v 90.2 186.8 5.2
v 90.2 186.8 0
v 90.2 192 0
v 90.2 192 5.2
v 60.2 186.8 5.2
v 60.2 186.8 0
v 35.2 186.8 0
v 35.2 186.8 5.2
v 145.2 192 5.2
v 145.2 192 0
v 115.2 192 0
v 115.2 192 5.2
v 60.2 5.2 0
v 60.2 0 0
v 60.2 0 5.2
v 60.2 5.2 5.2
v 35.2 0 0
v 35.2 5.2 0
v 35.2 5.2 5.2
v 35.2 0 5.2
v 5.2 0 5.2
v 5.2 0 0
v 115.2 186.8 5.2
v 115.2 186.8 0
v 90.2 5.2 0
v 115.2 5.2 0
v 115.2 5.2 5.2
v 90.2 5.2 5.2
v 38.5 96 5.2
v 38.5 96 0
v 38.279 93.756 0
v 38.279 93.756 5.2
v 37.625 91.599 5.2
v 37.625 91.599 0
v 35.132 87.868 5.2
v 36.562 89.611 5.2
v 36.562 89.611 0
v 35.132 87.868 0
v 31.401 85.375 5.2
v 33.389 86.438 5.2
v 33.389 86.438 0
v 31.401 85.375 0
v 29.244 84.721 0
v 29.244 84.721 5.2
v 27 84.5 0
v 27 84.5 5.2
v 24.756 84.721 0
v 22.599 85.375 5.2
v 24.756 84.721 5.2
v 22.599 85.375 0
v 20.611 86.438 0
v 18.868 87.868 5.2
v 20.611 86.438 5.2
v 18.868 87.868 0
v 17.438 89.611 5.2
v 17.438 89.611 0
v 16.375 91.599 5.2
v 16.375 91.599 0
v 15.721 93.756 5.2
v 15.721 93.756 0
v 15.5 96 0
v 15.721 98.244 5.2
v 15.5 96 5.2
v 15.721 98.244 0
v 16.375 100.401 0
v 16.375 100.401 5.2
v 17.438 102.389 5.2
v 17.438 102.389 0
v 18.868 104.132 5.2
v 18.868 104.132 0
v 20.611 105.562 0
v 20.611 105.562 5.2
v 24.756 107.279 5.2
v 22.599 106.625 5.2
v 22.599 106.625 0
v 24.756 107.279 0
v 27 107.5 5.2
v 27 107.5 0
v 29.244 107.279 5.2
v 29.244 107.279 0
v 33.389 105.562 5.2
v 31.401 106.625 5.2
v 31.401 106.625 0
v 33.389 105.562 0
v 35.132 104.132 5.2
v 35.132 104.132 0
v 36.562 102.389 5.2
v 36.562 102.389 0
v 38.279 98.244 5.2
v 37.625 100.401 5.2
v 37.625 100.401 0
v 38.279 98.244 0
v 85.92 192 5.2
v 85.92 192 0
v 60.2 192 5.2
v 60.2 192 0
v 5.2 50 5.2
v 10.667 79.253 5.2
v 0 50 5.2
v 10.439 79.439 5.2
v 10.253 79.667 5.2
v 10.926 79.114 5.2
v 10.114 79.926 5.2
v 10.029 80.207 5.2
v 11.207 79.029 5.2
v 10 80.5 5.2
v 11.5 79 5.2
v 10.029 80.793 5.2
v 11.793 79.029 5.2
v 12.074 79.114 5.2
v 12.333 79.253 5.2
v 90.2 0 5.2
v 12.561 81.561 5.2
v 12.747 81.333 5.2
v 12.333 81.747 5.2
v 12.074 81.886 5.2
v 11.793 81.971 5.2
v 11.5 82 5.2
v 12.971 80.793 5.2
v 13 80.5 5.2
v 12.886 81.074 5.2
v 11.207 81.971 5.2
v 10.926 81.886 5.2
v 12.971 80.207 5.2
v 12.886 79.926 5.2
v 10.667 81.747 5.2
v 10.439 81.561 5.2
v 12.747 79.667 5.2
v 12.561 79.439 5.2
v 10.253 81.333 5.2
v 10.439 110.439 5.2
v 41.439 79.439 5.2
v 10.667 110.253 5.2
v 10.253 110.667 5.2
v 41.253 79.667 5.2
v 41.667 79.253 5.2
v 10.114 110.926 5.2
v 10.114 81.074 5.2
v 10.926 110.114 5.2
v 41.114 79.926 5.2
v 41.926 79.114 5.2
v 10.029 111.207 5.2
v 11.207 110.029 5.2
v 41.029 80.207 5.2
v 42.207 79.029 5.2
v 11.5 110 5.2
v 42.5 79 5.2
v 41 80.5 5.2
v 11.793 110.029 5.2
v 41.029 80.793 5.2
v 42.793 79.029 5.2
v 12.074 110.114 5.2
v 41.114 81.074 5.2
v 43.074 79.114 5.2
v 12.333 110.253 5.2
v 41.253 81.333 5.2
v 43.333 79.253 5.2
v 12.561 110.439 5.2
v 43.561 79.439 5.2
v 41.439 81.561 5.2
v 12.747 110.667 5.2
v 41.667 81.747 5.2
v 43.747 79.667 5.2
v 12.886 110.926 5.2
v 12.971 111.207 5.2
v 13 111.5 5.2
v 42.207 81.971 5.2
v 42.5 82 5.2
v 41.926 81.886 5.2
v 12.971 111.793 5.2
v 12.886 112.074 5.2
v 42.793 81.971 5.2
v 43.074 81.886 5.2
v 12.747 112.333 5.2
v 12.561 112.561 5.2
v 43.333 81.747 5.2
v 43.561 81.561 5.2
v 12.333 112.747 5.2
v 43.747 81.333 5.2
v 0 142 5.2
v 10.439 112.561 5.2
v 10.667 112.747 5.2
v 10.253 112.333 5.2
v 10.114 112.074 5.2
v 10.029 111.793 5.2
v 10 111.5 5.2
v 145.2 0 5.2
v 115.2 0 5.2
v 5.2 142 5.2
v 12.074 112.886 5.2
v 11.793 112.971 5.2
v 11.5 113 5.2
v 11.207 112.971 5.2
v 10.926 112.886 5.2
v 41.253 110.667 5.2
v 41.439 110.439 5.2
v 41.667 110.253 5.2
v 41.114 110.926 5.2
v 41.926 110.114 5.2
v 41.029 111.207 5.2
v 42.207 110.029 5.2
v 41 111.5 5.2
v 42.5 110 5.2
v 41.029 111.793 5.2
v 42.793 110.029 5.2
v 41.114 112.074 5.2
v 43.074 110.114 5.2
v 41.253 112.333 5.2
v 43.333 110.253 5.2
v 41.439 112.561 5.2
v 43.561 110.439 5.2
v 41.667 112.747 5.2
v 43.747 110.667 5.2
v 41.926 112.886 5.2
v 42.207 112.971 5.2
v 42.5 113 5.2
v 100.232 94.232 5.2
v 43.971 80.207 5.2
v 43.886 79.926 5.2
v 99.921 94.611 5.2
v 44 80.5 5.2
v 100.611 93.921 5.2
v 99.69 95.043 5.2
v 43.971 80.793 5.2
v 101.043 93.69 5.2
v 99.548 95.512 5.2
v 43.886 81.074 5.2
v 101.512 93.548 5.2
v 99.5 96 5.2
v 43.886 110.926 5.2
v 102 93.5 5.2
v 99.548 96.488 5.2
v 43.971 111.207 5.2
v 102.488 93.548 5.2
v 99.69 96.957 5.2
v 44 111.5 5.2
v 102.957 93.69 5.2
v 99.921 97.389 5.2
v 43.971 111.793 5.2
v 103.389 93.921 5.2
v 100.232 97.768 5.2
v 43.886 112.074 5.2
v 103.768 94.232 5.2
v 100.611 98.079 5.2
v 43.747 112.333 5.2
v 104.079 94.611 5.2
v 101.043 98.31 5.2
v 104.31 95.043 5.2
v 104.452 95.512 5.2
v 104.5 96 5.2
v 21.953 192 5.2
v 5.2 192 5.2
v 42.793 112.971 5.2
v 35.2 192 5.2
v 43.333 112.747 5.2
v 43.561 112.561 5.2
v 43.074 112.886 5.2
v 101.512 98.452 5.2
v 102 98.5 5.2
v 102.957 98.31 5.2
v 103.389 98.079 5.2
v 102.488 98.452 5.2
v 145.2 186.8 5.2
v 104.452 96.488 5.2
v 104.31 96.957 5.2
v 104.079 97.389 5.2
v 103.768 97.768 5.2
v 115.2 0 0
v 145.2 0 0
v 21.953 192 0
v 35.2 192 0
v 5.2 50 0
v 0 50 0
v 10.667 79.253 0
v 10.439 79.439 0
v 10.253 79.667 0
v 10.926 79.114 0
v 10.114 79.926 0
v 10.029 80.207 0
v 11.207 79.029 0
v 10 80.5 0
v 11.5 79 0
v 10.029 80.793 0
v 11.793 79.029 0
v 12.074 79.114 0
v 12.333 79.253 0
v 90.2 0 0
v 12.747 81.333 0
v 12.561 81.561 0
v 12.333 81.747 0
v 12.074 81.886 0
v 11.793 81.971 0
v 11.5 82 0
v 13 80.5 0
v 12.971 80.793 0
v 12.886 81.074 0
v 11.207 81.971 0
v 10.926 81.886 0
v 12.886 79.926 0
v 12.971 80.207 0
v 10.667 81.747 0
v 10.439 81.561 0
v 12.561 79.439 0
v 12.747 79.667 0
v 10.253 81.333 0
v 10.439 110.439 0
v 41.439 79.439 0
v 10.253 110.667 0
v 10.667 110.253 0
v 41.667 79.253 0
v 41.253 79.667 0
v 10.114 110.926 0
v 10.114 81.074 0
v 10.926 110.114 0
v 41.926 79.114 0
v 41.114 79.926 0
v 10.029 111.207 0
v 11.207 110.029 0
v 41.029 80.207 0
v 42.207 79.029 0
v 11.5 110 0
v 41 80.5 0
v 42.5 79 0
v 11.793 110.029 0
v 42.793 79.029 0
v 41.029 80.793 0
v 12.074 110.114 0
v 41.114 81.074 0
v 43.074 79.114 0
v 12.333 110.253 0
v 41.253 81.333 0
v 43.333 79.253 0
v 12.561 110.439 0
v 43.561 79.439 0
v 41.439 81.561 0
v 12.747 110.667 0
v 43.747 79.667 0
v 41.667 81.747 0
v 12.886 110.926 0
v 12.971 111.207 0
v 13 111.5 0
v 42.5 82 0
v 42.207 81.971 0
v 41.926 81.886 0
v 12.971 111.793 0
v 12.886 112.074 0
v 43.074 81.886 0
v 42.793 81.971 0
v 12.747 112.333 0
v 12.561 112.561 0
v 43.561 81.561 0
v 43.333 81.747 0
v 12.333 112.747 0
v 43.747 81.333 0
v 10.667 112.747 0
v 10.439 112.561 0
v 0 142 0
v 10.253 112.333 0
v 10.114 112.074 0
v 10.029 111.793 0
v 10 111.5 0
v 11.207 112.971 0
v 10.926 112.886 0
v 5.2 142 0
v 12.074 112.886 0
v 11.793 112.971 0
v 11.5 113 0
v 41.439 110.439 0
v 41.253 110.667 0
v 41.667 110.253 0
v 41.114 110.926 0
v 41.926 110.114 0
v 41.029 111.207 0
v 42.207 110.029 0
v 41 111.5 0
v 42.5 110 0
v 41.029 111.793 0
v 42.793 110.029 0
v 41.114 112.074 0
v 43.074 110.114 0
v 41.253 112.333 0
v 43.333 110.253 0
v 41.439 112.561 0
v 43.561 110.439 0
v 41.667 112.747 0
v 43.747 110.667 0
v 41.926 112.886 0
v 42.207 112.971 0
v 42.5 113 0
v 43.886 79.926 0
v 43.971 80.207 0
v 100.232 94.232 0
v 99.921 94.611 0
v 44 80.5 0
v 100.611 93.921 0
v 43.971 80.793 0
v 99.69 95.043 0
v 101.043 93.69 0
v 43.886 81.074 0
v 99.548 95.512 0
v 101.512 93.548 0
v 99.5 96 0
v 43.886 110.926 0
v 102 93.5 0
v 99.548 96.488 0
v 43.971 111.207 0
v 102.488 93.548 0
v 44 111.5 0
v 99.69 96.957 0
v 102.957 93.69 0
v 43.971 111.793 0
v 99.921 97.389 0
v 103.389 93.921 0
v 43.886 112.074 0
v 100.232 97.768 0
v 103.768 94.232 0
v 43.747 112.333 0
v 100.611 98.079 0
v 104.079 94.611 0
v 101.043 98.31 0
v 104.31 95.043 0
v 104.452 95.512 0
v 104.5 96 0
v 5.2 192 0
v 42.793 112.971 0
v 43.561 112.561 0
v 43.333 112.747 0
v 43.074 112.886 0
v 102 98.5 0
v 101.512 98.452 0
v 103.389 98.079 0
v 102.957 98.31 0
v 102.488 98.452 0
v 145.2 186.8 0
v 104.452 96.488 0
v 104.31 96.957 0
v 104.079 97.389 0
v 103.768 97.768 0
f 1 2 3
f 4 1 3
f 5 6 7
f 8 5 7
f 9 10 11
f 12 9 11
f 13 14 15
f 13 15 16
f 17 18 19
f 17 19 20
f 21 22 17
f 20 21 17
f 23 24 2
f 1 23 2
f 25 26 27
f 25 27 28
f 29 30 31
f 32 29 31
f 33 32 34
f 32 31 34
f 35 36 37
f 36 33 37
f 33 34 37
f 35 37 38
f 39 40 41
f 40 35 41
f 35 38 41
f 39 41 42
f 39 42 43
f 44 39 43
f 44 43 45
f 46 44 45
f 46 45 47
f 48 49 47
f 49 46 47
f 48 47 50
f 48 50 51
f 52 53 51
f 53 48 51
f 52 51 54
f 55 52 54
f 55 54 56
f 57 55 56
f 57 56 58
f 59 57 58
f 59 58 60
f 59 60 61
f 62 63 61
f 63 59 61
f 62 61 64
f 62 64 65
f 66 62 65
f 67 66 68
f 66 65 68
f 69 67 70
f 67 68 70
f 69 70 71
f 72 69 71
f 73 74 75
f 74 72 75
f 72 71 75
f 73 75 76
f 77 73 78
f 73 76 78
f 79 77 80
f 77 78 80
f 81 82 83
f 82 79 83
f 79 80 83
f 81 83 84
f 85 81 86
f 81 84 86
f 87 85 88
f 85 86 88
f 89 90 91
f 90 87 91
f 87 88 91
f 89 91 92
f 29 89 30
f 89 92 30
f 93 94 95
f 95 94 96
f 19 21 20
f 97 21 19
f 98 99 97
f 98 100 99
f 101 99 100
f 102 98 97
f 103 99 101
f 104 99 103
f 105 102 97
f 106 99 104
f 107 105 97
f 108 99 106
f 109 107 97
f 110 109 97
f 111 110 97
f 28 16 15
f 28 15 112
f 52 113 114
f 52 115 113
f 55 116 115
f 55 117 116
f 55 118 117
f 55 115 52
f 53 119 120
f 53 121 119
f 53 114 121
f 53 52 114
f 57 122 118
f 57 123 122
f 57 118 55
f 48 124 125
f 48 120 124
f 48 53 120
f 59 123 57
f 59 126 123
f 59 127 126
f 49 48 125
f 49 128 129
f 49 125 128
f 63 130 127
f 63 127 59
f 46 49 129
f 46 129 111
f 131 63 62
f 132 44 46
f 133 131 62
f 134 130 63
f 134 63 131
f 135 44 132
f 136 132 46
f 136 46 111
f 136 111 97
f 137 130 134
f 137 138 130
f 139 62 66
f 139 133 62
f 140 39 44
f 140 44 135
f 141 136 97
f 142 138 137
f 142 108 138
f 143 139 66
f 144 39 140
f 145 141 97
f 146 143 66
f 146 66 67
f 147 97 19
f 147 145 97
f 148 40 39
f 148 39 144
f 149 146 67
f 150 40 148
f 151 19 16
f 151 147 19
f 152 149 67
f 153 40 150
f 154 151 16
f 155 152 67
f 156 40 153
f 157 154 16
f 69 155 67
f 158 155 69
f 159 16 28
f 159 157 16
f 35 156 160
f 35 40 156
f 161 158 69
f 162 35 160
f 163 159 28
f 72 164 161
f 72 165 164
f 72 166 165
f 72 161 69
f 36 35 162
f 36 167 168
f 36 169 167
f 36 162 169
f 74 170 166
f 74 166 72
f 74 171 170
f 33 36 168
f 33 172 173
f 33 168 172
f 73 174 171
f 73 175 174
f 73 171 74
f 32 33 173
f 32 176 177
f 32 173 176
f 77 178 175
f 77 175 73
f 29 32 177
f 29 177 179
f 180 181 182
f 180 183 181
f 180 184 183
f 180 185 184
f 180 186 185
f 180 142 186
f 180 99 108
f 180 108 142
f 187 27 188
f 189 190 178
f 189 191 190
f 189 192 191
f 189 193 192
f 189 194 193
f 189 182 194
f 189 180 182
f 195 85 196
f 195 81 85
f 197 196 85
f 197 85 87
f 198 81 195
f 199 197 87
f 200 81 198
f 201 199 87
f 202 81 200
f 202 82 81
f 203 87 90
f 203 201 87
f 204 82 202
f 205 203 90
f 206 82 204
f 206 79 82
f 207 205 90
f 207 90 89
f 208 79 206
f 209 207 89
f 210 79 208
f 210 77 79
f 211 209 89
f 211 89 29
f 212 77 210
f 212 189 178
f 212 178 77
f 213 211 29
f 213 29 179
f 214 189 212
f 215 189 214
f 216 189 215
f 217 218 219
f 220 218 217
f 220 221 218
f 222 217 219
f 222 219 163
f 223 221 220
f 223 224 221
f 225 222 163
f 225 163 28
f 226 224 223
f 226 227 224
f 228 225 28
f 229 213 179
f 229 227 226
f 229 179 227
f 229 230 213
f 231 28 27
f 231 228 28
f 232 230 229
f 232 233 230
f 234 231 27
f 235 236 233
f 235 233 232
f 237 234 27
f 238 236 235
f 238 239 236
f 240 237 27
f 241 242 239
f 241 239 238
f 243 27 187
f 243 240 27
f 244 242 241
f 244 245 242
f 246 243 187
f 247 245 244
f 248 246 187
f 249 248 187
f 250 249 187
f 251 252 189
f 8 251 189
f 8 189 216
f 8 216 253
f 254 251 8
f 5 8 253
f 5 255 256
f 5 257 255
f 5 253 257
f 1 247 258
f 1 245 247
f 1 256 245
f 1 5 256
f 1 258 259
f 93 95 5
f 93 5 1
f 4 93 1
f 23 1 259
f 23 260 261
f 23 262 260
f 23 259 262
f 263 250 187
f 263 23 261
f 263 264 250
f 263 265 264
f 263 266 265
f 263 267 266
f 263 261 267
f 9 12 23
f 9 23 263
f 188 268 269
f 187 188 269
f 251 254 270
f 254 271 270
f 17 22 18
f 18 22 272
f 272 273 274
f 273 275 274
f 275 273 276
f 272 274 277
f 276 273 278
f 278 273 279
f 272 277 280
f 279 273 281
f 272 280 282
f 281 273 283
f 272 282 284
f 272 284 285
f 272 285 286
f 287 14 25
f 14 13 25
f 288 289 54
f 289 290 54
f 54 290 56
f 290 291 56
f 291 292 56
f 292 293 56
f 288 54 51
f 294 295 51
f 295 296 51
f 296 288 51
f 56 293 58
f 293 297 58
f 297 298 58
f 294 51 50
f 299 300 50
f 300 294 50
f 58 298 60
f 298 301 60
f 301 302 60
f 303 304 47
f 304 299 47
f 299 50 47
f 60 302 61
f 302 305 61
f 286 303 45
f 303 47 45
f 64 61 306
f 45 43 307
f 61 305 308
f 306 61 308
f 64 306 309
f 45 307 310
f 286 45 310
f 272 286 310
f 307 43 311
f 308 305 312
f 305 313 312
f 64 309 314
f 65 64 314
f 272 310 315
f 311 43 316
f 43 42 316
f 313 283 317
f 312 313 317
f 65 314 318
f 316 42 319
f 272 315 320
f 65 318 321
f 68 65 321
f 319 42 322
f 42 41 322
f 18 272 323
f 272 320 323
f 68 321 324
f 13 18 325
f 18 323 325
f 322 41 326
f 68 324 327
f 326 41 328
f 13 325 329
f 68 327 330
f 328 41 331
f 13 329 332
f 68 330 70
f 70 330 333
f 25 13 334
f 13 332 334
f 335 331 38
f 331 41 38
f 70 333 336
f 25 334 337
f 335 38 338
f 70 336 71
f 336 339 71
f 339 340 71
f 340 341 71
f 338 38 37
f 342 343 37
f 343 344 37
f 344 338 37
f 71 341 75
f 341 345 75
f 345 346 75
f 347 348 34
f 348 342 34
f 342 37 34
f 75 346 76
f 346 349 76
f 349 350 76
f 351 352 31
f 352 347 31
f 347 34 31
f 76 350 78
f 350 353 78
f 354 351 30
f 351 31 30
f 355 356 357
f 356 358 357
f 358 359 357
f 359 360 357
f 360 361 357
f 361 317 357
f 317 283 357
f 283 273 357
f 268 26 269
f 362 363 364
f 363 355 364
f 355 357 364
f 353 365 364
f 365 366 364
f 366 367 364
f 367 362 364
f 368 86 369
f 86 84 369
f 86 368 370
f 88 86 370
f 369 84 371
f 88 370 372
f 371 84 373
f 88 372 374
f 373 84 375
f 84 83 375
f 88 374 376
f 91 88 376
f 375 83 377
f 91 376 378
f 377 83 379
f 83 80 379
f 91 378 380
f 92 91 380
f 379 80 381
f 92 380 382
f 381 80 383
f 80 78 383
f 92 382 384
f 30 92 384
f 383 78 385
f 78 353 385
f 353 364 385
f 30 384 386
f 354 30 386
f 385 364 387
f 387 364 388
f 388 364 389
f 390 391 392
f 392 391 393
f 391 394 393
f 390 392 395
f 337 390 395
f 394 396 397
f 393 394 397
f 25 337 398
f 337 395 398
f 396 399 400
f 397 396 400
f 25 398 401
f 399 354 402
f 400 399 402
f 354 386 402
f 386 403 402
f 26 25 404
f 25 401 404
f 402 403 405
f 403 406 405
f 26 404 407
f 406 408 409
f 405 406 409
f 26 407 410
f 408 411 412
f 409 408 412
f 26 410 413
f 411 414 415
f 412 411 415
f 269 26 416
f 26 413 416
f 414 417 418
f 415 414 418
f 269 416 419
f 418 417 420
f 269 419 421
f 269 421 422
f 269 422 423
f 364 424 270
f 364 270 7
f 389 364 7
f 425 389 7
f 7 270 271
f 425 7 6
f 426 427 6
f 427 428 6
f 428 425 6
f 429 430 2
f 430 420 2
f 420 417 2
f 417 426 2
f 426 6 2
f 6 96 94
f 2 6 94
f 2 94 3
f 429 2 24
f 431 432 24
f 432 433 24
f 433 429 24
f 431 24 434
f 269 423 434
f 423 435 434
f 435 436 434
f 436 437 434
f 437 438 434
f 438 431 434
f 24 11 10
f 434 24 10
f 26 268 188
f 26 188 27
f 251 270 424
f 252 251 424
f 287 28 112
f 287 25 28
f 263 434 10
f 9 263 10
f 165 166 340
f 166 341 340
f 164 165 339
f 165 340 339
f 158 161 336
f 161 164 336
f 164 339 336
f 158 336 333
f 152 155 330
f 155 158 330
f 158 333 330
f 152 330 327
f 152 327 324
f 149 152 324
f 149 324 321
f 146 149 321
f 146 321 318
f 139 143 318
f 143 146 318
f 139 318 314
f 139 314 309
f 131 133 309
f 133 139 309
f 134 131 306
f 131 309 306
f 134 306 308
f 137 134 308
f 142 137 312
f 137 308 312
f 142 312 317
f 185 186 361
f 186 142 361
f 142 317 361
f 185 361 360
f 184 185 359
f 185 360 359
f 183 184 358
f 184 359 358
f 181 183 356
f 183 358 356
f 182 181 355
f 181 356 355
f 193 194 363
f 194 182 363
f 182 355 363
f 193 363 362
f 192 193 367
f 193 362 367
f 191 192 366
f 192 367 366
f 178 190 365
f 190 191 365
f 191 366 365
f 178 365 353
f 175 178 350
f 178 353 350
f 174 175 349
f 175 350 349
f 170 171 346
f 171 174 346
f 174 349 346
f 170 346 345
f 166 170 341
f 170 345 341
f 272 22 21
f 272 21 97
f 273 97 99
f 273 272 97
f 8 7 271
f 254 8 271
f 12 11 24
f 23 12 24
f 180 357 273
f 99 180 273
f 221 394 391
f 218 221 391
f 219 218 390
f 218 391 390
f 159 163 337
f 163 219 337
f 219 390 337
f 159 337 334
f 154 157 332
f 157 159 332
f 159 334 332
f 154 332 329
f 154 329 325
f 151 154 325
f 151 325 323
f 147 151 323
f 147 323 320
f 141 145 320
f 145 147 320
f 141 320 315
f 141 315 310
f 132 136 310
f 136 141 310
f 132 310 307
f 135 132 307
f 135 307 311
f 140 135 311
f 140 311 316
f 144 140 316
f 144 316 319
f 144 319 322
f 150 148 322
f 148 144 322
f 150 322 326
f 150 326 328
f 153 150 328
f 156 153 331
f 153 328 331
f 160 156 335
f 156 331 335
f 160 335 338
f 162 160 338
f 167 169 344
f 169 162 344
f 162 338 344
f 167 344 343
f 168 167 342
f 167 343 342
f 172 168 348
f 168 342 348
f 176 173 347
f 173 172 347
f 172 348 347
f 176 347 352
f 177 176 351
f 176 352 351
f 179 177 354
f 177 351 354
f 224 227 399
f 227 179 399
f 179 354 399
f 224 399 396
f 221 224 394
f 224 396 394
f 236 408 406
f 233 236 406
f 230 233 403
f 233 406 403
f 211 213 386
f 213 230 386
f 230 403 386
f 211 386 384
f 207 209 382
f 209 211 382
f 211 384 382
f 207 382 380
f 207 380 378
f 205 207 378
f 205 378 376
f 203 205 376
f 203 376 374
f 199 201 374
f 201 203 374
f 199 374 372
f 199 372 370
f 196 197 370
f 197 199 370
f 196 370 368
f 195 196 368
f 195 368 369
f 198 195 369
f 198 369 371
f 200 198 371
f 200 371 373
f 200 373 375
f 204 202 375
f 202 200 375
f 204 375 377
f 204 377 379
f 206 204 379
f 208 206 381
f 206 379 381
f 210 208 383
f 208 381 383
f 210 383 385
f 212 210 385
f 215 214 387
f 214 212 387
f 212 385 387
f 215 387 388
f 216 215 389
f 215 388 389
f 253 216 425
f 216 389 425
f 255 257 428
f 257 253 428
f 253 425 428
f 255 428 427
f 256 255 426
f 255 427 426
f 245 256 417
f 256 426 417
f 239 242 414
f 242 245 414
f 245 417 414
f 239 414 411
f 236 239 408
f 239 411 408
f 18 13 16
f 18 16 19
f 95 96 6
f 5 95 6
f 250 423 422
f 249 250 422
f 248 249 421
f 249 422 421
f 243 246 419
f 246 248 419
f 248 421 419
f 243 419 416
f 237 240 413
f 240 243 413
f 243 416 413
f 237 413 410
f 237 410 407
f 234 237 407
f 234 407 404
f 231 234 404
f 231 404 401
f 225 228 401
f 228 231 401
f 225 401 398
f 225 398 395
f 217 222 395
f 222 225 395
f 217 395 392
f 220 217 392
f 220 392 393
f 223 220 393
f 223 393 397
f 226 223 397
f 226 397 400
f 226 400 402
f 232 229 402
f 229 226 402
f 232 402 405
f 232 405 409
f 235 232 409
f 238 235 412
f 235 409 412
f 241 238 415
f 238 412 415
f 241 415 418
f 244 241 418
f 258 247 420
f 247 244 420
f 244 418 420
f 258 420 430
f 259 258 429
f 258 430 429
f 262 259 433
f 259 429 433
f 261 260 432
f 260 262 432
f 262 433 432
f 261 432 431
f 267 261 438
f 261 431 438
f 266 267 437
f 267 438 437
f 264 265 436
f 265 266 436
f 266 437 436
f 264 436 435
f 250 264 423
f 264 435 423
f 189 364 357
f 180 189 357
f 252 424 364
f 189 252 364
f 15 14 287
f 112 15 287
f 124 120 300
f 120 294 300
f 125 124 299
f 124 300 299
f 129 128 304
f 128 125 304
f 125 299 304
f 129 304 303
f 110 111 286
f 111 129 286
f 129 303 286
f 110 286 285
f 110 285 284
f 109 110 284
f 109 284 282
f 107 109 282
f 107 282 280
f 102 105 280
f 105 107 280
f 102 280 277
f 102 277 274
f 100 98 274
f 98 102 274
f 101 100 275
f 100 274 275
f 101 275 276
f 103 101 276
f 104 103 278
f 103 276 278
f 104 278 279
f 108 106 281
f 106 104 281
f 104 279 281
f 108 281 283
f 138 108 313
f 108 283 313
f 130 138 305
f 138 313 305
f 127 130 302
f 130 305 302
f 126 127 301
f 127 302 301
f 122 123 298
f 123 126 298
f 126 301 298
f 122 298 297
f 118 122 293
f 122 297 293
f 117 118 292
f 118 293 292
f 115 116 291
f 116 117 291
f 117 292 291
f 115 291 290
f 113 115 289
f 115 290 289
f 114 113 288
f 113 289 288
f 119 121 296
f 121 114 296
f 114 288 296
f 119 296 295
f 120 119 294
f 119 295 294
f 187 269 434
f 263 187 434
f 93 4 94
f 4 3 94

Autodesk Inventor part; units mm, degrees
ref_plane "YZ Plane" through (0, 0, 0) normal (1, 0, 0) x (0, 1, 0)
ref_plane "XZ Plane" through (0, 0, 0) normal (0, 1, 0) x (-1, 0, 0)
ref_plane "XY Plane" through (0, 0, 0) normal (0, 0, 1) x (1, 0, 0)
sketch "Sketch1" plane through (0, 0, 0) normal (0, 0, 1) x (1, 0, 0)
  line L0 (0, 0) -> (145.2, 0)
  line L1 (145.2, 0) -> (145.2, 192)
  line L2 (145.2, 192) -> (0, 192)
  line L3 (0, 192) -> (0, 0)
  line L4 (145.2, 192) -> (110.498, 192)
  line L5 (145.2, 186.8) -> (145.2, 192)
  line L6 (85.92, 192) -> (45.5217, 192)
  line L7 (21.953, 192) -> (0, 192)
  line L8 (0, 192) -> (0, 185.7065)
  line L9 (35.2, 192) -> (60.2, 192)
  line L10 (60.2, 192) -> (60.2, 186.8)
  line L11 (60.2, 186.8) -> (35.2, 186.8)
  line L12 (35.2, 186.8) -> (35.2, 192)
  line L13 (90.2, 192) -> (115.2, 192)
  line L14 (115.2, 192) -> (115.2, 186.8)
  line L15 (115.2, 186.8) -> (90.2, 186.8)
  line L16 (90.2, 186.8) -> (90.2, 192)
  line L17 (0, 192) -> (5.2, 192)
  line L18 (5.2, 192) -> (5.2, 142)
  line L19 (5.2, 142) -> (0, 142)
  line L20 (0, 142) -> (0, 192)
  line L21 (0, 96) -> (145.2, 96) construction
  line L22 (0, 0) -> (5.2, 0)
  line L23 (5.2, 0) -> (5.2, 50)
  line L24 (5.2, 50) -> (0, 50)
  line L25 (0, 50) -> (0, 0)
  line L26 (35.2, 0) -> (60.2, 0)
  line L27 (60.2, 0) -> (60.2, 5.2)
  line L28 (60.2, 5.2) -> (35.2, 5.2)
  line L29 (35.2, 5.2) -> (35.2, 0)
  line L30 (90.2, 0) -> (115.2, 0)
  line L31 (115.2, 0) -> (115.2, 5.2)
  line L32 (115.2, 5.2) -> (90.2, 5.2)
  line L33 (90.2, 5.2) -> (90.2, 0)
  circle A0 centre (102, 96) radius 2.5
  circle A1 centre (27, 96) radius 11.5
  circle A2 centre (42.5, 80.5) radius 1.5
  circle A3 centre (42.5, 111.5) radius 1.5
  circle A4 centre (11.5, 111.5) radius 1.5
  circle A5 centre (11.5, 80.5) radius 1.5
  dimension "d0" = 192
  dimension "d1" = 145.2
  dimension "d6" = 25
  dimension "d7" = 25
  dimension "d8" = 5.2
  dimension "d9" = 30
  dimension "d10" = 30
  dimension "d11" = 50
  dimension "d12" = 5.2
  dimension "d13" = 50
  dimension "d14" = 5.2
  dimension "d15" = 25
  dimension "d16" = 25
  dimension "d17" = 5.2
  dimension "d18" = 30
  dimension "d19" = 30
  dimension "d22" = 5
  dimension "d24" = 23
  dimension "d25" = 3
  dimension "d26" = 15.5
  dimension "d27" = 15.5
  dimension "d30" = 360
  dimension "d32" = 75
  dimension "d33" = 27
extrude "Extrusion2" add sketch "Sketch1" along normal blind 5.2 contours L23 L24 L3 L19 L18 L2 L12 L11 L10 L16 L15 L14 L1 L0 L31 L32 L33 L27 L28 L29
properties part number "Base Plate"
